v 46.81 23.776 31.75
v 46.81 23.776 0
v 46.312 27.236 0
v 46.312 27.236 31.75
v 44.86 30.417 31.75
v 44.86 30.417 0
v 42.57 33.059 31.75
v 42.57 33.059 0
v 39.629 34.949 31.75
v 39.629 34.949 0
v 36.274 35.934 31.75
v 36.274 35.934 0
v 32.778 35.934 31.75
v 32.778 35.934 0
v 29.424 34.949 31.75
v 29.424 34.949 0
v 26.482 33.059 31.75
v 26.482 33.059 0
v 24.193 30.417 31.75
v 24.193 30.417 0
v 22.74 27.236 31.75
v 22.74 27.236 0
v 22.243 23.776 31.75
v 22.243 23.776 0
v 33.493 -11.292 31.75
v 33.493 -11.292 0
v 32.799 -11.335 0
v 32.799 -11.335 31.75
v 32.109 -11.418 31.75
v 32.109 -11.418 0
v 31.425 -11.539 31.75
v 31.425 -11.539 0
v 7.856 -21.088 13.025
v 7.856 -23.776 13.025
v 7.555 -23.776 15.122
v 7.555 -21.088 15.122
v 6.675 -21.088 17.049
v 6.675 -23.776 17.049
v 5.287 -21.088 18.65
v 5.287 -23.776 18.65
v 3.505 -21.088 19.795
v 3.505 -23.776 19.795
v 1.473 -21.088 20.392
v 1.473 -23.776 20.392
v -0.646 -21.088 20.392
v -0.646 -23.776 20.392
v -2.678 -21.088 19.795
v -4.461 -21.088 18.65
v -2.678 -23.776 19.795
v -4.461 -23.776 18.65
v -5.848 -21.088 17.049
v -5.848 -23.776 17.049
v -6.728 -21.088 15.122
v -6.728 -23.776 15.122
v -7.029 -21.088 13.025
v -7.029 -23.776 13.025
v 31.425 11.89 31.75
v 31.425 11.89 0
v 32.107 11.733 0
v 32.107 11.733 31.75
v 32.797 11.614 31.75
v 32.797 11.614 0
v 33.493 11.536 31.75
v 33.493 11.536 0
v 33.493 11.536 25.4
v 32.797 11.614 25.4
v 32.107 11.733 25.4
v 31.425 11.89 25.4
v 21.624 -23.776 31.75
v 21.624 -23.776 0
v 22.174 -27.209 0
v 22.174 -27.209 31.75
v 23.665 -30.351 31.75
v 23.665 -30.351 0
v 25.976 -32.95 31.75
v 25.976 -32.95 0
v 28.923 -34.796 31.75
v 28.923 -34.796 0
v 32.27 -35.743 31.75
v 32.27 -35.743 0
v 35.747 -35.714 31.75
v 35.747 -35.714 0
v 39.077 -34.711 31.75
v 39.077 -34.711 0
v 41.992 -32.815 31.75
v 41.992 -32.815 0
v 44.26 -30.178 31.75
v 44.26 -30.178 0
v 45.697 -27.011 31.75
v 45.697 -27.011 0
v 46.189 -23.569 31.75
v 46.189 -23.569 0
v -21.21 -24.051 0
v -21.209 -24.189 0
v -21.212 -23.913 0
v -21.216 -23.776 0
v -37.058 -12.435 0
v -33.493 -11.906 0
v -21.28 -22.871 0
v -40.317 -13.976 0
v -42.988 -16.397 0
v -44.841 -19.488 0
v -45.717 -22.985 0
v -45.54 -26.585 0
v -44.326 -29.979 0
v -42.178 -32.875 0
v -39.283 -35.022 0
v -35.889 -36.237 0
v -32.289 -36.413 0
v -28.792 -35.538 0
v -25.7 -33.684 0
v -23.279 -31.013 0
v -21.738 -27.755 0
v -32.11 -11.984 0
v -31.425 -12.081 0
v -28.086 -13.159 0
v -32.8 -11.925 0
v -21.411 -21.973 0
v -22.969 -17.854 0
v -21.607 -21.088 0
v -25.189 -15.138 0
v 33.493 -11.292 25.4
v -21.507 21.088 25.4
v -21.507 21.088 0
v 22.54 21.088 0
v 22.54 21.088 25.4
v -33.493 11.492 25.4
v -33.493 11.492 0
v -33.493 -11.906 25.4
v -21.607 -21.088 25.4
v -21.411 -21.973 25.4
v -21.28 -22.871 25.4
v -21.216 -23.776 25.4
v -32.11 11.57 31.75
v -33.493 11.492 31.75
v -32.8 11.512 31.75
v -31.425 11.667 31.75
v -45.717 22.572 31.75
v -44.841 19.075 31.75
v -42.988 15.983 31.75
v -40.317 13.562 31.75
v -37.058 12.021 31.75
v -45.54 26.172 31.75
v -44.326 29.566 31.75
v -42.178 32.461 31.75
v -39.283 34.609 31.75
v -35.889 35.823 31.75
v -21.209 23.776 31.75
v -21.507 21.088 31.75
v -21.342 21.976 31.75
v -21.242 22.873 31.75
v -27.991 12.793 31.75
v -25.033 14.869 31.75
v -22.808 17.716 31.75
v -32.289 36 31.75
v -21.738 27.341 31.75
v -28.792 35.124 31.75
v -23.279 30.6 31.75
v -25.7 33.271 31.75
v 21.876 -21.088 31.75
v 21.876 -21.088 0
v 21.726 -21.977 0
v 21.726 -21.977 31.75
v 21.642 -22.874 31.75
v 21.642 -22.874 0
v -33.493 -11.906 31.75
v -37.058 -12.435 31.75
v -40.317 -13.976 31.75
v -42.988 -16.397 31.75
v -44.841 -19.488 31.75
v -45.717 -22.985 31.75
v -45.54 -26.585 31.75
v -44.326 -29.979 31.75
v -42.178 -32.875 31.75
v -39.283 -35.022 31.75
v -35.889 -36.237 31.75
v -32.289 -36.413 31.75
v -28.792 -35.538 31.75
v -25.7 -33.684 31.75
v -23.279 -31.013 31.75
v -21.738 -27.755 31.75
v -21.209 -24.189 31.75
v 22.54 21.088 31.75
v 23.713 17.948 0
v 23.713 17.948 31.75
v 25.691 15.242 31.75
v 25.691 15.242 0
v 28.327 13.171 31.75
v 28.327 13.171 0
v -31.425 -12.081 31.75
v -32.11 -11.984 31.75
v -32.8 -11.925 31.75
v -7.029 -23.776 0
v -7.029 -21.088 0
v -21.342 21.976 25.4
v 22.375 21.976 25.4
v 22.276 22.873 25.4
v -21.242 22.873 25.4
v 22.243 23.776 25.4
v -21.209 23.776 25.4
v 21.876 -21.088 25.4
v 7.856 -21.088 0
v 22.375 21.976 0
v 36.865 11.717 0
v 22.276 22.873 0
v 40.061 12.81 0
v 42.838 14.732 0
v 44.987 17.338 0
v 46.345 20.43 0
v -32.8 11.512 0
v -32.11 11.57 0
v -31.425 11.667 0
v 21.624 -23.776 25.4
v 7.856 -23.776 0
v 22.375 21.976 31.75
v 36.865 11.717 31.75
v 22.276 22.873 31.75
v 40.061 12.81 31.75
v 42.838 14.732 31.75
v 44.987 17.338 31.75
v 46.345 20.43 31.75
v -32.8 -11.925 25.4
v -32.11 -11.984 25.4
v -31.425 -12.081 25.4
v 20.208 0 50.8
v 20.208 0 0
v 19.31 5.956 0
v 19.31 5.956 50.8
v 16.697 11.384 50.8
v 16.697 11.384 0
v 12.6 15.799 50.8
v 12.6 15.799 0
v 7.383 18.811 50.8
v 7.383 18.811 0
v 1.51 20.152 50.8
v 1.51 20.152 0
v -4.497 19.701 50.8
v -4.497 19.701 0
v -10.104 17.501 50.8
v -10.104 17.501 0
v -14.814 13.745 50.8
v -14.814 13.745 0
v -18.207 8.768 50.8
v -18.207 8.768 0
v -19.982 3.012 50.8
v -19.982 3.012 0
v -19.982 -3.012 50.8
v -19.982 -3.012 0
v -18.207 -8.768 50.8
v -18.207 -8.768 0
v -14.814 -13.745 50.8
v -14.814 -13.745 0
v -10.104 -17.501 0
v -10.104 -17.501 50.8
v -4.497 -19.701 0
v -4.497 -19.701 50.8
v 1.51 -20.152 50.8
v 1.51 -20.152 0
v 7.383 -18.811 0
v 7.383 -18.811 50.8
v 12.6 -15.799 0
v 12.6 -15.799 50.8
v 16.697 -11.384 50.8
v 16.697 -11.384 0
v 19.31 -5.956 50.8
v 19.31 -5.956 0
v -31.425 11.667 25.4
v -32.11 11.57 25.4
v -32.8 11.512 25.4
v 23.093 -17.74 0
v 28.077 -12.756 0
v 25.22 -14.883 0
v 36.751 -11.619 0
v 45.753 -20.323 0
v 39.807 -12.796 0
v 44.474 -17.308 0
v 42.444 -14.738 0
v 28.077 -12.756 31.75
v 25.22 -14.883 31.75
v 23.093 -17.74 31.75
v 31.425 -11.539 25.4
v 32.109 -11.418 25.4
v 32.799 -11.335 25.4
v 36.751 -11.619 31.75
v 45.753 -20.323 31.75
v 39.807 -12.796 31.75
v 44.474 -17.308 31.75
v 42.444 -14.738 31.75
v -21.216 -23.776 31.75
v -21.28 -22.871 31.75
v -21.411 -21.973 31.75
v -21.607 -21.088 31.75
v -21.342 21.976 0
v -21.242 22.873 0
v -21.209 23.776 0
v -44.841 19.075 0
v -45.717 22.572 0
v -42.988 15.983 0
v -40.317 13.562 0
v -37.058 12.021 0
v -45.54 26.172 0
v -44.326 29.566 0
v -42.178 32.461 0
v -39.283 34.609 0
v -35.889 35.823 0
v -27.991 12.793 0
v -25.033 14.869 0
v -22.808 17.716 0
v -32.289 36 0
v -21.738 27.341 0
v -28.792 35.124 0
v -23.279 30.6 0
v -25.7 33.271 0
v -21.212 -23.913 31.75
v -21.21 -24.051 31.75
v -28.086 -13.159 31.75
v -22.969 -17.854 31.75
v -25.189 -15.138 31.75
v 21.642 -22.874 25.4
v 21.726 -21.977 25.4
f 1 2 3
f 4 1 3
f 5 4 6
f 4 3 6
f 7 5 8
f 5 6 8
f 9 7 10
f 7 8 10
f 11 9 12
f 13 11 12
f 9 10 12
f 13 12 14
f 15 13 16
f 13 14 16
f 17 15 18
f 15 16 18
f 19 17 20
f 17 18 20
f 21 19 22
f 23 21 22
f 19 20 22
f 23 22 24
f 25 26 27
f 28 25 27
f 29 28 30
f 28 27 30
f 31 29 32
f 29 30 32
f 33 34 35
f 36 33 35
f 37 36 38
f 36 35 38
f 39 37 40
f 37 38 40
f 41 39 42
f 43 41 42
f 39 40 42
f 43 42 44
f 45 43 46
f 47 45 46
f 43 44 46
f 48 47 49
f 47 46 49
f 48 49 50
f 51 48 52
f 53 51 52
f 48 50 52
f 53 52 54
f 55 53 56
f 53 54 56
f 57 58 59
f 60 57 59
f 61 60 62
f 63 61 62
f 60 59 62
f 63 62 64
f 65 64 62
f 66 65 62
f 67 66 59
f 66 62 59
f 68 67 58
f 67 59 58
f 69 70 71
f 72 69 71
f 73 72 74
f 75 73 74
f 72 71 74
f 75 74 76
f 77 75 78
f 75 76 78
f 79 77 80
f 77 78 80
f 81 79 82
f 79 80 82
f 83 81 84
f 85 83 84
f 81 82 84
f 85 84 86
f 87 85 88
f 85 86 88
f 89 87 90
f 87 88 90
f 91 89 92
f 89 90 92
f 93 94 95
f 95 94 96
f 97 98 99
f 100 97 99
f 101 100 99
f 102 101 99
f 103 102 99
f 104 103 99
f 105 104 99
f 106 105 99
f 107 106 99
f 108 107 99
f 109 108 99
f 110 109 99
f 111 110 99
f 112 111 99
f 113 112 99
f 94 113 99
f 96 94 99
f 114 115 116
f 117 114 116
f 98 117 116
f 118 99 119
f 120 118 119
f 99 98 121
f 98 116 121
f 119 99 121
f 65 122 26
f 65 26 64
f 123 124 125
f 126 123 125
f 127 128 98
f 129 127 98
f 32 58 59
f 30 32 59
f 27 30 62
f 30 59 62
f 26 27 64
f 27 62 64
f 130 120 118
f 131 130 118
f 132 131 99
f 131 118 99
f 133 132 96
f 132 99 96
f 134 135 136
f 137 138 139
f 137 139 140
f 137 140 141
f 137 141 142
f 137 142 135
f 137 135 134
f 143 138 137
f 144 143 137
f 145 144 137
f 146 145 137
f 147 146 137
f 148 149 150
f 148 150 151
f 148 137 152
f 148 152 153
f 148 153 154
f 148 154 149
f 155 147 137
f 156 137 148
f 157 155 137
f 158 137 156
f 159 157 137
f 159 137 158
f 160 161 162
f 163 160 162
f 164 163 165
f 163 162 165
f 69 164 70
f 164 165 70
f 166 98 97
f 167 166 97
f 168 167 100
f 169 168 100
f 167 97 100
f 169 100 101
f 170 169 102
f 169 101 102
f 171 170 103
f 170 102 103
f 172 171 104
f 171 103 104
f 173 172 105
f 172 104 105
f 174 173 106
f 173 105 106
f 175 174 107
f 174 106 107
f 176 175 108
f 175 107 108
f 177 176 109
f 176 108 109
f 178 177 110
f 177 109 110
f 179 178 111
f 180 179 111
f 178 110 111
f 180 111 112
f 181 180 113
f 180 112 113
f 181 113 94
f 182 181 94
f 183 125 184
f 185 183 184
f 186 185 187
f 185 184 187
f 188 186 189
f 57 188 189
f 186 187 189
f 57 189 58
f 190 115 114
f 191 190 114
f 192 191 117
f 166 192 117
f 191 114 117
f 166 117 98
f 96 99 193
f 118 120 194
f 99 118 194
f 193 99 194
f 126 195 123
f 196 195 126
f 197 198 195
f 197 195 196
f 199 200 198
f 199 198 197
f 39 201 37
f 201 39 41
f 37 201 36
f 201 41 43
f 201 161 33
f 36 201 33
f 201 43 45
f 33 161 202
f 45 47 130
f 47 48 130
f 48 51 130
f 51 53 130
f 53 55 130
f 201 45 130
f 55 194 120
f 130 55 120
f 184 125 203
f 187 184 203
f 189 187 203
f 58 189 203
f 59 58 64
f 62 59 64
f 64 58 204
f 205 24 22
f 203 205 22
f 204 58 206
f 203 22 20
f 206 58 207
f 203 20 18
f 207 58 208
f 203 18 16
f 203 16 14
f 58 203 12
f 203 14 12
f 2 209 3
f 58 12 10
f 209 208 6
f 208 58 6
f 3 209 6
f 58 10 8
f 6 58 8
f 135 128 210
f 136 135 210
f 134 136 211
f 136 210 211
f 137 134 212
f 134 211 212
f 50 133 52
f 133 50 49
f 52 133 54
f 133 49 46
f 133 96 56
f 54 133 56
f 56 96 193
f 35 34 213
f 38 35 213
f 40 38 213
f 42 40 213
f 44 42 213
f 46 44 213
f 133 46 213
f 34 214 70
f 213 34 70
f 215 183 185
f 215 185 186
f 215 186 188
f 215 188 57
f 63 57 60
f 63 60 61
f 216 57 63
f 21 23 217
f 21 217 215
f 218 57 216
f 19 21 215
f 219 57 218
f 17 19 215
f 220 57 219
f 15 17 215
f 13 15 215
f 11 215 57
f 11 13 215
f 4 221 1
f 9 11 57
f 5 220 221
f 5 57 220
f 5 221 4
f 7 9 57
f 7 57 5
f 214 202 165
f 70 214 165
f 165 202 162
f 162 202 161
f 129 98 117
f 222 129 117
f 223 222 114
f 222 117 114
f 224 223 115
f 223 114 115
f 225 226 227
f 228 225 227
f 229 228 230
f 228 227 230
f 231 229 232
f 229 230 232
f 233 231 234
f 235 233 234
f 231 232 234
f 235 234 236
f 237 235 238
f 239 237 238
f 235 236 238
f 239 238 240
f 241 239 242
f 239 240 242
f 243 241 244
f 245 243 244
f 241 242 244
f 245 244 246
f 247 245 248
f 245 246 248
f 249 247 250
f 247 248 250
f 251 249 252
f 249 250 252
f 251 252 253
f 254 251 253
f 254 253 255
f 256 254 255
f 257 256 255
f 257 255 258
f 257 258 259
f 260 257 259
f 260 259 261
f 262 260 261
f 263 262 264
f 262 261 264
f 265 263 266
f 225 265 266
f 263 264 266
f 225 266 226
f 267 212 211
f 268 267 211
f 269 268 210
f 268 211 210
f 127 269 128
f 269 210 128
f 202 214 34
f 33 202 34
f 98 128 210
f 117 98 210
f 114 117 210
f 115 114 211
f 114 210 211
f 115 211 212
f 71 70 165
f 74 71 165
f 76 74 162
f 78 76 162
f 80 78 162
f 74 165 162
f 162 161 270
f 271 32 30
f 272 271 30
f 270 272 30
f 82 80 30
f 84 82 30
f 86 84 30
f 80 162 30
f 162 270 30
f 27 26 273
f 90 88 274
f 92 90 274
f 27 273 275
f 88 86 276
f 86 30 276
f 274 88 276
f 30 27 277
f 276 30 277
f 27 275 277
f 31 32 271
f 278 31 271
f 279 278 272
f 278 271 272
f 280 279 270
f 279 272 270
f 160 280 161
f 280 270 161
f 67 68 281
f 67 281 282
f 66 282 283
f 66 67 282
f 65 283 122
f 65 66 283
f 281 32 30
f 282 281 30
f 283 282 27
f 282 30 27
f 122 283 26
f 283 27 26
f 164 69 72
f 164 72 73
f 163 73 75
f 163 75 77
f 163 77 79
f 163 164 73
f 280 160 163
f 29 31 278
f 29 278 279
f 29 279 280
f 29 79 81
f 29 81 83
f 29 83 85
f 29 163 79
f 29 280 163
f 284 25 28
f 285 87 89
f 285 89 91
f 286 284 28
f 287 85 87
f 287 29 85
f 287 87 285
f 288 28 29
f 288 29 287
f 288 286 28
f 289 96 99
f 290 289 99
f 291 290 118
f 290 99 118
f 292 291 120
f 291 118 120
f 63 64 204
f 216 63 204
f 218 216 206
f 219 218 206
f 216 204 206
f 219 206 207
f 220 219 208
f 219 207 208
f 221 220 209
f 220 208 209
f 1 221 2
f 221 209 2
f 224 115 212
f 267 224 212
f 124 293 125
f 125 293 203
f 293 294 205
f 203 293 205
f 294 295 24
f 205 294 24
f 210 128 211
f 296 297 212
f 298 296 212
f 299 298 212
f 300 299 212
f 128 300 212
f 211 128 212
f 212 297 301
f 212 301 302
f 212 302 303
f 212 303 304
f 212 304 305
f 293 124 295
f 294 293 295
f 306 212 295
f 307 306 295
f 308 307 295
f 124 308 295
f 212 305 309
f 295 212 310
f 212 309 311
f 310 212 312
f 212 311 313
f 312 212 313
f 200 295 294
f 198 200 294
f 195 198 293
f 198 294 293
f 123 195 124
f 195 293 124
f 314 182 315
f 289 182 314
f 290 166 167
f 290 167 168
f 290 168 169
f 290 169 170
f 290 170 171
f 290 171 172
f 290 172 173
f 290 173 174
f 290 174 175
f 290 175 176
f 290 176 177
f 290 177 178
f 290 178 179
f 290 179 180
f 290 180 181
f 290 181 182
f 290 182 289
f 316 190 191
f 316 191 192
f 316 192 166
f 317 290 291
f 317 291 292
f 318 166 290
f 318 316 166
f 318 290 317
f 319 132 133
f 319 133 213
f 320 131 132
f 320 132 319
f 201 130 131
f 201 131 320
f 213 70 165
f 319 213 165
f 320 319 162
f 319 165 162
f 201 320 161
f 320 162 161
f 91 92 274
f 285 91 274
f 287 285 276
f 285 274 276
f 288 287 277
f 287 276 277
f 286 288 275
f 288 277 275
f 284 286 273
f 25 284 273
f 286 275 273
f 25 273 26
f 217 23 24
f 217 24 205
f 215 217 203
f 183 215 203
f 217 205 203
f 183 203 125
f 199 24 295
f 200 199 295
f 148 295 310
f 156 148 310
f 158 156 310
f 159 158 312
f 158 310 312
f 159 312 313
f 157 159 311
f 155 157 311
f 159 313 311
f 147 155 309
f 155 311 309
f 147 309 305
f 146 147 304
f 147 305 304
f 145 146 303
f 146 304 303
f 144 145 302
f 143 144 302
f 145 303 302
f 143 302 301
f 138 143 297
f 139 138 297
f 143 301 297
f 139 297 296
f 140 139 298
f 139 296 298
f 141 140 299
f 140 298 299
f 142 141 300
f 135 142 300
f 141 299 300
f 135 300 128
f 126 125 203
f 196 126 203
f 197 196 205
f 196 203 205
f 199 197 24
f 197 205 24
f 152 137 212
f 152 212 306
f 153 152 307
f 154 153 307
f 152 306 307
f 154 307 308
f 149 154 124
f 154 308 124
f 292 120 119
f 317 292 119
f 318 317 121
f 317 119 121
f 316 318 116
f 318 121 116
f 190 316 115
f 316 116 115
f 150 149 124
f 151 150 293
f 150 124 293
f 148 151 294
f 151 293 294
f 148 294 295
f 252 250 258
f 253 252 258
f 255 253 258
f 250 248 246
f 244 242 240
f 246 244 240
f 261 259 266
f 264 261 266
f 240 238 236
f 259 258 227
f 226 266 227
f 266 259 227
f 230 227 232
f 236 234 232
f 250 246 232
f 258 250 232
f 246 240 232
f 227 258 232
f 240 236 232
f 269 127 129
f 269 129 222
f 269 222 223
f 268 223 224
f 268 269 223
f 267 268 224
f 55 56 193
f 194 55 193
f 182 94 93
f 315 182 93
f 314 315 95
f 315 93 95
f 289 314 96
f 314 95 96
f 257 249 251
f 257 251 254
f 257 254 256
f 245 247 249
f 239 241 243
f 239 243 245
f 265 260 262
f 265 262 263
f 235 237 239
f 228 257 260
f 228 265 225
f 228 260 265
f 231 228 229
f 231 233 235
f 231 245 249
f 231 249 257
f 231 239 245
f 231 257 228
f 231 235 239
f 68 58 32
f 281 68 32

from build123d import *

# Parameters (mm, degrees)
F1_DEPTH = 25.4
F2_DEPTH = 31.75
F0_R     = 20.2081200016
F3_DEPTH = 50.8
F5_DEPTH = 25.4


with BuildPart() as f1:
    # F0 (on Top) → F1 (new body)
    with BuildSketch(Plane.XY):
        with BuildLine():
            Line((22.2428232494, 23.7755812705), (-21.2090998951, 23.7755812705))
            ThreePointArc((-21.2090998951, 23.7755812705), (-21.2837375348, 22.4235288232), (-21.5067434167, 21.0879072547))
            Line((-21.5067434167, 21.0879072547), (22.5404667711, 21.0879072547))
            ThreePointArc((22.5404667711, 21.0879072547), (22.3174608892, 22.4235288232), (22.2428232494, 23.7755812705))
        make_face()
    extrude(amount=F1_DEPTH)


with BuildPart() as f1b:
    # F0 (on Top) → F1, piece 2 (new body)
    with BuildSketch(Plane.XY):
        with BuildLine():
            Line((33.4925577044, -11.2923389787), (33.4925577044, 11.5356976198))
            ThreePointArc((33.4925577044, 11.5356976198), (32.4511353861, 11.6686780251), (31.4248725772, 11.8901026859))
            Line((31.4248725772, 11.8901026859), (31.4248725772, -11.5385687696))
            ThreePointArc((31.4248725772, -11.5385687696), (32.4534881194, -11.3715605888), (33.4925577044, -11.2923389787))
        make_face()
    extrude(amount=F1_DEPTH)


with BuildPart() as f1c:
    # F0 (on Top) → F1, piece 3 (new body)
    with BuildSketch(Plane.XY):
        with BuildLine():
            Line((21.8756893355, -21.0879072547), (-21.6070149652, -21.0879072547))
            ThreePointArc((-21.6070149652, -21.0879072547), (-21.3370268115, -22.4209057163), (-21.2160613421, -23.7755812705))
            Line((-21.2160613421, -23.7755812705), (21.6242800548, -23.7755812705))
            ThreePointArc((21.6242800548, -23.7755812705), (21.675930241, -22.4248170917), (21.8756893355, -21.0879072547))
        make_face()
    extrude(amount=F1_DEPTH)

    # F4 (on face) → F5 (cut)
    with BuildSketch(Plane.XZ.offset(23.7755812705)):
        with BuildLine():
            Line((-7.0293024182, 13.0248842761), (-7.0293024182, 0))
            Line((-7.0293024182, 0), (7.8562796116, 0))
            Line((7.8562796116, 0), (7.8562796116, 13.0248842761))
            ThreePointArc((7.8562796116, 13.0248842761), (0.4134885967, 20.467675291), (-7.0293024182, 13.0248842761))
        make_face()
    extrude(amount=-F5_DEPTH, mode=Mode.SUBTRACT)


with BuildPart() as f1d:
    # F0 (on Top) → F1, piece 4 (new body)
    with BuildSketch(Plane.XY):
        with BuildLine():
            ThreePointArc((-31.4248725772, 11.6674016398), (-32.4550071966, 11.5360214459), (-33.4925577044, 11.4921234611))
            Line((-33.4925577044, 11.4921234611), (-33.4925577044, -11.9056120578))
            ThreePointArc((-33.4925577044, -11.9056120578), (-32.4550071966, -11.9495100426), (-31.4248725772, -12.0808902364))
            Line((-31.4248725772, -12.0808902364), (-31.4248725772, 11.6674016398))
        make_face()
    extrude(amount=F1_DEPTH)


with BuildPart() as f2:
    # F0 (on Top) → F2 (new body)
    with BuildSketch(Plane.XY):
        with BuildLine():
            ThreePointArc((-21.5067434167, 21.0879072547), (-21.2837375348, 22.4235288232), (-21.2090998951, 23.7755812705))
            ThreePointArc((-21.2090998951, 23.7755812705), (-42.1782740179, 32.4612975839), (-33.4925577044, 11.4921234611))
            ThreePointArc((-33.4925577044, 11.4921234611), (-32.4550071966, 11.5360214459), (-31.4248725772, 11.6674016398))
            ThreePointArc((-31.4248725772, 11.6674016398), (-25.0331432471, 14.8693114119), (-21.5067434167, 21.0879072547))
        make_face()
    extrude(amount=F2_DEPTH)


with BuildPart() as f2b:
    # F0 (on Top) → F2, piece 2 (new body)
    with BuildSketch(Plane.XY):
        with BuildLine():
            ThreePointArc((-31.4248725772, -12.0808902364), (-32.4550071966, -11.9495100426), (-33.4925577044, -11.9056120578))
            ThreePointArc((-33.4925577044, -11.9056120578), (-42.1782740179, -32.8747861806), (-21.2090998951, -24.1890698671))
            ThreePointArc((-21.2090998951, -24.1890698671), (-21.2108403801, -23.9822962703), (-21.2160613421, -23.7755812705))
            ThreePointArc((-21.2160613421, -23.7755812705), (-21.3370268115, -22.4209057163), (-21.6070149652, -21.0879072547))
            ThreePointArc((-21.6070149652, -21.0879072547), (-25.1886591703, -15.137627723), (-31.4248725772, -12.0808902364))
        make_face()
    extrude(amount=F2_DEPTH)


with BuildPart() as f2c:
    # F0 (on Top) → F2, piece 3 (new body)
    with BuildSketch(Plane.XY):
        with BuildLine():
            ThreePointArc((46.8097388682, 23.7755812705), (34.5262810588, 36.0590390798), (22.2428232494, 23.7755812705))
            ThreePointArc((22.2428232494, 23.7755812705), (22.3174608892, 22.4235288232), (22.5404667711, 21.0879072547))
            ThreePointArc((22.5404667711, 21.0879072547), (25.6913518036, 15.2416864498), (31.4248725772, 11.8901026859))
            ThreePointArc((31.4248725772, 11.8901026859), (32.4511353861, 11.6686780251), (33.4925577044, 11.5356976198))
            ThreePointArc((33.4925577044, 11.5356976198), (42.8384901077, 14.7317703214), (46.8097388682, 23.7755812705))
        make_face()
    extrude(amount=F2_DEPTH)


with BuildPart() as f2d:
    # F0 (on Top) → F2, piece 4 (new body)
    with BuildSketch(Plane.XY):
        with BuildLine():
            ThreePointArc((46.1894556817, -23.5688369721), (42.4442898823, -14.7381571961), (33.4925577044, -11.2923389787))
            ThreePointArc((33.4925577044, -11.2923389787), (32.4534881194, -11.3715605888), (31.4248725772, -11.5385687696))
            ThreePointArc((31.4248725772, -11.5385687696), (25.2202109569, -14.8831912613), (21.8756893355, -21.0879072547))
            ThreePointArc((21.8756893355, -21.0879072547), (21.675930241, -22.4248170917), (21.6242800548, -23.7755812705))
            ThreePointArc((21.6242800548, -23.7755812705), (34.0093736825, -35.8518597758), (46.1894556817, -23.5688369721))
        make_face()
    extrude(amount=F2_DEPTH)


with BuildPart() as f3:
    # F0 (on Top) → F3 (new body)
    with BuildSketch(Plane.XY):
        Circle(F0_R)
    extrude(amount=F3_DEPTH)


solid = Compound([f1.part, f1b.part, f1c.part, f1d.part, f2.part, f2b.part, f2c.part, f2d.part, f3.part])
